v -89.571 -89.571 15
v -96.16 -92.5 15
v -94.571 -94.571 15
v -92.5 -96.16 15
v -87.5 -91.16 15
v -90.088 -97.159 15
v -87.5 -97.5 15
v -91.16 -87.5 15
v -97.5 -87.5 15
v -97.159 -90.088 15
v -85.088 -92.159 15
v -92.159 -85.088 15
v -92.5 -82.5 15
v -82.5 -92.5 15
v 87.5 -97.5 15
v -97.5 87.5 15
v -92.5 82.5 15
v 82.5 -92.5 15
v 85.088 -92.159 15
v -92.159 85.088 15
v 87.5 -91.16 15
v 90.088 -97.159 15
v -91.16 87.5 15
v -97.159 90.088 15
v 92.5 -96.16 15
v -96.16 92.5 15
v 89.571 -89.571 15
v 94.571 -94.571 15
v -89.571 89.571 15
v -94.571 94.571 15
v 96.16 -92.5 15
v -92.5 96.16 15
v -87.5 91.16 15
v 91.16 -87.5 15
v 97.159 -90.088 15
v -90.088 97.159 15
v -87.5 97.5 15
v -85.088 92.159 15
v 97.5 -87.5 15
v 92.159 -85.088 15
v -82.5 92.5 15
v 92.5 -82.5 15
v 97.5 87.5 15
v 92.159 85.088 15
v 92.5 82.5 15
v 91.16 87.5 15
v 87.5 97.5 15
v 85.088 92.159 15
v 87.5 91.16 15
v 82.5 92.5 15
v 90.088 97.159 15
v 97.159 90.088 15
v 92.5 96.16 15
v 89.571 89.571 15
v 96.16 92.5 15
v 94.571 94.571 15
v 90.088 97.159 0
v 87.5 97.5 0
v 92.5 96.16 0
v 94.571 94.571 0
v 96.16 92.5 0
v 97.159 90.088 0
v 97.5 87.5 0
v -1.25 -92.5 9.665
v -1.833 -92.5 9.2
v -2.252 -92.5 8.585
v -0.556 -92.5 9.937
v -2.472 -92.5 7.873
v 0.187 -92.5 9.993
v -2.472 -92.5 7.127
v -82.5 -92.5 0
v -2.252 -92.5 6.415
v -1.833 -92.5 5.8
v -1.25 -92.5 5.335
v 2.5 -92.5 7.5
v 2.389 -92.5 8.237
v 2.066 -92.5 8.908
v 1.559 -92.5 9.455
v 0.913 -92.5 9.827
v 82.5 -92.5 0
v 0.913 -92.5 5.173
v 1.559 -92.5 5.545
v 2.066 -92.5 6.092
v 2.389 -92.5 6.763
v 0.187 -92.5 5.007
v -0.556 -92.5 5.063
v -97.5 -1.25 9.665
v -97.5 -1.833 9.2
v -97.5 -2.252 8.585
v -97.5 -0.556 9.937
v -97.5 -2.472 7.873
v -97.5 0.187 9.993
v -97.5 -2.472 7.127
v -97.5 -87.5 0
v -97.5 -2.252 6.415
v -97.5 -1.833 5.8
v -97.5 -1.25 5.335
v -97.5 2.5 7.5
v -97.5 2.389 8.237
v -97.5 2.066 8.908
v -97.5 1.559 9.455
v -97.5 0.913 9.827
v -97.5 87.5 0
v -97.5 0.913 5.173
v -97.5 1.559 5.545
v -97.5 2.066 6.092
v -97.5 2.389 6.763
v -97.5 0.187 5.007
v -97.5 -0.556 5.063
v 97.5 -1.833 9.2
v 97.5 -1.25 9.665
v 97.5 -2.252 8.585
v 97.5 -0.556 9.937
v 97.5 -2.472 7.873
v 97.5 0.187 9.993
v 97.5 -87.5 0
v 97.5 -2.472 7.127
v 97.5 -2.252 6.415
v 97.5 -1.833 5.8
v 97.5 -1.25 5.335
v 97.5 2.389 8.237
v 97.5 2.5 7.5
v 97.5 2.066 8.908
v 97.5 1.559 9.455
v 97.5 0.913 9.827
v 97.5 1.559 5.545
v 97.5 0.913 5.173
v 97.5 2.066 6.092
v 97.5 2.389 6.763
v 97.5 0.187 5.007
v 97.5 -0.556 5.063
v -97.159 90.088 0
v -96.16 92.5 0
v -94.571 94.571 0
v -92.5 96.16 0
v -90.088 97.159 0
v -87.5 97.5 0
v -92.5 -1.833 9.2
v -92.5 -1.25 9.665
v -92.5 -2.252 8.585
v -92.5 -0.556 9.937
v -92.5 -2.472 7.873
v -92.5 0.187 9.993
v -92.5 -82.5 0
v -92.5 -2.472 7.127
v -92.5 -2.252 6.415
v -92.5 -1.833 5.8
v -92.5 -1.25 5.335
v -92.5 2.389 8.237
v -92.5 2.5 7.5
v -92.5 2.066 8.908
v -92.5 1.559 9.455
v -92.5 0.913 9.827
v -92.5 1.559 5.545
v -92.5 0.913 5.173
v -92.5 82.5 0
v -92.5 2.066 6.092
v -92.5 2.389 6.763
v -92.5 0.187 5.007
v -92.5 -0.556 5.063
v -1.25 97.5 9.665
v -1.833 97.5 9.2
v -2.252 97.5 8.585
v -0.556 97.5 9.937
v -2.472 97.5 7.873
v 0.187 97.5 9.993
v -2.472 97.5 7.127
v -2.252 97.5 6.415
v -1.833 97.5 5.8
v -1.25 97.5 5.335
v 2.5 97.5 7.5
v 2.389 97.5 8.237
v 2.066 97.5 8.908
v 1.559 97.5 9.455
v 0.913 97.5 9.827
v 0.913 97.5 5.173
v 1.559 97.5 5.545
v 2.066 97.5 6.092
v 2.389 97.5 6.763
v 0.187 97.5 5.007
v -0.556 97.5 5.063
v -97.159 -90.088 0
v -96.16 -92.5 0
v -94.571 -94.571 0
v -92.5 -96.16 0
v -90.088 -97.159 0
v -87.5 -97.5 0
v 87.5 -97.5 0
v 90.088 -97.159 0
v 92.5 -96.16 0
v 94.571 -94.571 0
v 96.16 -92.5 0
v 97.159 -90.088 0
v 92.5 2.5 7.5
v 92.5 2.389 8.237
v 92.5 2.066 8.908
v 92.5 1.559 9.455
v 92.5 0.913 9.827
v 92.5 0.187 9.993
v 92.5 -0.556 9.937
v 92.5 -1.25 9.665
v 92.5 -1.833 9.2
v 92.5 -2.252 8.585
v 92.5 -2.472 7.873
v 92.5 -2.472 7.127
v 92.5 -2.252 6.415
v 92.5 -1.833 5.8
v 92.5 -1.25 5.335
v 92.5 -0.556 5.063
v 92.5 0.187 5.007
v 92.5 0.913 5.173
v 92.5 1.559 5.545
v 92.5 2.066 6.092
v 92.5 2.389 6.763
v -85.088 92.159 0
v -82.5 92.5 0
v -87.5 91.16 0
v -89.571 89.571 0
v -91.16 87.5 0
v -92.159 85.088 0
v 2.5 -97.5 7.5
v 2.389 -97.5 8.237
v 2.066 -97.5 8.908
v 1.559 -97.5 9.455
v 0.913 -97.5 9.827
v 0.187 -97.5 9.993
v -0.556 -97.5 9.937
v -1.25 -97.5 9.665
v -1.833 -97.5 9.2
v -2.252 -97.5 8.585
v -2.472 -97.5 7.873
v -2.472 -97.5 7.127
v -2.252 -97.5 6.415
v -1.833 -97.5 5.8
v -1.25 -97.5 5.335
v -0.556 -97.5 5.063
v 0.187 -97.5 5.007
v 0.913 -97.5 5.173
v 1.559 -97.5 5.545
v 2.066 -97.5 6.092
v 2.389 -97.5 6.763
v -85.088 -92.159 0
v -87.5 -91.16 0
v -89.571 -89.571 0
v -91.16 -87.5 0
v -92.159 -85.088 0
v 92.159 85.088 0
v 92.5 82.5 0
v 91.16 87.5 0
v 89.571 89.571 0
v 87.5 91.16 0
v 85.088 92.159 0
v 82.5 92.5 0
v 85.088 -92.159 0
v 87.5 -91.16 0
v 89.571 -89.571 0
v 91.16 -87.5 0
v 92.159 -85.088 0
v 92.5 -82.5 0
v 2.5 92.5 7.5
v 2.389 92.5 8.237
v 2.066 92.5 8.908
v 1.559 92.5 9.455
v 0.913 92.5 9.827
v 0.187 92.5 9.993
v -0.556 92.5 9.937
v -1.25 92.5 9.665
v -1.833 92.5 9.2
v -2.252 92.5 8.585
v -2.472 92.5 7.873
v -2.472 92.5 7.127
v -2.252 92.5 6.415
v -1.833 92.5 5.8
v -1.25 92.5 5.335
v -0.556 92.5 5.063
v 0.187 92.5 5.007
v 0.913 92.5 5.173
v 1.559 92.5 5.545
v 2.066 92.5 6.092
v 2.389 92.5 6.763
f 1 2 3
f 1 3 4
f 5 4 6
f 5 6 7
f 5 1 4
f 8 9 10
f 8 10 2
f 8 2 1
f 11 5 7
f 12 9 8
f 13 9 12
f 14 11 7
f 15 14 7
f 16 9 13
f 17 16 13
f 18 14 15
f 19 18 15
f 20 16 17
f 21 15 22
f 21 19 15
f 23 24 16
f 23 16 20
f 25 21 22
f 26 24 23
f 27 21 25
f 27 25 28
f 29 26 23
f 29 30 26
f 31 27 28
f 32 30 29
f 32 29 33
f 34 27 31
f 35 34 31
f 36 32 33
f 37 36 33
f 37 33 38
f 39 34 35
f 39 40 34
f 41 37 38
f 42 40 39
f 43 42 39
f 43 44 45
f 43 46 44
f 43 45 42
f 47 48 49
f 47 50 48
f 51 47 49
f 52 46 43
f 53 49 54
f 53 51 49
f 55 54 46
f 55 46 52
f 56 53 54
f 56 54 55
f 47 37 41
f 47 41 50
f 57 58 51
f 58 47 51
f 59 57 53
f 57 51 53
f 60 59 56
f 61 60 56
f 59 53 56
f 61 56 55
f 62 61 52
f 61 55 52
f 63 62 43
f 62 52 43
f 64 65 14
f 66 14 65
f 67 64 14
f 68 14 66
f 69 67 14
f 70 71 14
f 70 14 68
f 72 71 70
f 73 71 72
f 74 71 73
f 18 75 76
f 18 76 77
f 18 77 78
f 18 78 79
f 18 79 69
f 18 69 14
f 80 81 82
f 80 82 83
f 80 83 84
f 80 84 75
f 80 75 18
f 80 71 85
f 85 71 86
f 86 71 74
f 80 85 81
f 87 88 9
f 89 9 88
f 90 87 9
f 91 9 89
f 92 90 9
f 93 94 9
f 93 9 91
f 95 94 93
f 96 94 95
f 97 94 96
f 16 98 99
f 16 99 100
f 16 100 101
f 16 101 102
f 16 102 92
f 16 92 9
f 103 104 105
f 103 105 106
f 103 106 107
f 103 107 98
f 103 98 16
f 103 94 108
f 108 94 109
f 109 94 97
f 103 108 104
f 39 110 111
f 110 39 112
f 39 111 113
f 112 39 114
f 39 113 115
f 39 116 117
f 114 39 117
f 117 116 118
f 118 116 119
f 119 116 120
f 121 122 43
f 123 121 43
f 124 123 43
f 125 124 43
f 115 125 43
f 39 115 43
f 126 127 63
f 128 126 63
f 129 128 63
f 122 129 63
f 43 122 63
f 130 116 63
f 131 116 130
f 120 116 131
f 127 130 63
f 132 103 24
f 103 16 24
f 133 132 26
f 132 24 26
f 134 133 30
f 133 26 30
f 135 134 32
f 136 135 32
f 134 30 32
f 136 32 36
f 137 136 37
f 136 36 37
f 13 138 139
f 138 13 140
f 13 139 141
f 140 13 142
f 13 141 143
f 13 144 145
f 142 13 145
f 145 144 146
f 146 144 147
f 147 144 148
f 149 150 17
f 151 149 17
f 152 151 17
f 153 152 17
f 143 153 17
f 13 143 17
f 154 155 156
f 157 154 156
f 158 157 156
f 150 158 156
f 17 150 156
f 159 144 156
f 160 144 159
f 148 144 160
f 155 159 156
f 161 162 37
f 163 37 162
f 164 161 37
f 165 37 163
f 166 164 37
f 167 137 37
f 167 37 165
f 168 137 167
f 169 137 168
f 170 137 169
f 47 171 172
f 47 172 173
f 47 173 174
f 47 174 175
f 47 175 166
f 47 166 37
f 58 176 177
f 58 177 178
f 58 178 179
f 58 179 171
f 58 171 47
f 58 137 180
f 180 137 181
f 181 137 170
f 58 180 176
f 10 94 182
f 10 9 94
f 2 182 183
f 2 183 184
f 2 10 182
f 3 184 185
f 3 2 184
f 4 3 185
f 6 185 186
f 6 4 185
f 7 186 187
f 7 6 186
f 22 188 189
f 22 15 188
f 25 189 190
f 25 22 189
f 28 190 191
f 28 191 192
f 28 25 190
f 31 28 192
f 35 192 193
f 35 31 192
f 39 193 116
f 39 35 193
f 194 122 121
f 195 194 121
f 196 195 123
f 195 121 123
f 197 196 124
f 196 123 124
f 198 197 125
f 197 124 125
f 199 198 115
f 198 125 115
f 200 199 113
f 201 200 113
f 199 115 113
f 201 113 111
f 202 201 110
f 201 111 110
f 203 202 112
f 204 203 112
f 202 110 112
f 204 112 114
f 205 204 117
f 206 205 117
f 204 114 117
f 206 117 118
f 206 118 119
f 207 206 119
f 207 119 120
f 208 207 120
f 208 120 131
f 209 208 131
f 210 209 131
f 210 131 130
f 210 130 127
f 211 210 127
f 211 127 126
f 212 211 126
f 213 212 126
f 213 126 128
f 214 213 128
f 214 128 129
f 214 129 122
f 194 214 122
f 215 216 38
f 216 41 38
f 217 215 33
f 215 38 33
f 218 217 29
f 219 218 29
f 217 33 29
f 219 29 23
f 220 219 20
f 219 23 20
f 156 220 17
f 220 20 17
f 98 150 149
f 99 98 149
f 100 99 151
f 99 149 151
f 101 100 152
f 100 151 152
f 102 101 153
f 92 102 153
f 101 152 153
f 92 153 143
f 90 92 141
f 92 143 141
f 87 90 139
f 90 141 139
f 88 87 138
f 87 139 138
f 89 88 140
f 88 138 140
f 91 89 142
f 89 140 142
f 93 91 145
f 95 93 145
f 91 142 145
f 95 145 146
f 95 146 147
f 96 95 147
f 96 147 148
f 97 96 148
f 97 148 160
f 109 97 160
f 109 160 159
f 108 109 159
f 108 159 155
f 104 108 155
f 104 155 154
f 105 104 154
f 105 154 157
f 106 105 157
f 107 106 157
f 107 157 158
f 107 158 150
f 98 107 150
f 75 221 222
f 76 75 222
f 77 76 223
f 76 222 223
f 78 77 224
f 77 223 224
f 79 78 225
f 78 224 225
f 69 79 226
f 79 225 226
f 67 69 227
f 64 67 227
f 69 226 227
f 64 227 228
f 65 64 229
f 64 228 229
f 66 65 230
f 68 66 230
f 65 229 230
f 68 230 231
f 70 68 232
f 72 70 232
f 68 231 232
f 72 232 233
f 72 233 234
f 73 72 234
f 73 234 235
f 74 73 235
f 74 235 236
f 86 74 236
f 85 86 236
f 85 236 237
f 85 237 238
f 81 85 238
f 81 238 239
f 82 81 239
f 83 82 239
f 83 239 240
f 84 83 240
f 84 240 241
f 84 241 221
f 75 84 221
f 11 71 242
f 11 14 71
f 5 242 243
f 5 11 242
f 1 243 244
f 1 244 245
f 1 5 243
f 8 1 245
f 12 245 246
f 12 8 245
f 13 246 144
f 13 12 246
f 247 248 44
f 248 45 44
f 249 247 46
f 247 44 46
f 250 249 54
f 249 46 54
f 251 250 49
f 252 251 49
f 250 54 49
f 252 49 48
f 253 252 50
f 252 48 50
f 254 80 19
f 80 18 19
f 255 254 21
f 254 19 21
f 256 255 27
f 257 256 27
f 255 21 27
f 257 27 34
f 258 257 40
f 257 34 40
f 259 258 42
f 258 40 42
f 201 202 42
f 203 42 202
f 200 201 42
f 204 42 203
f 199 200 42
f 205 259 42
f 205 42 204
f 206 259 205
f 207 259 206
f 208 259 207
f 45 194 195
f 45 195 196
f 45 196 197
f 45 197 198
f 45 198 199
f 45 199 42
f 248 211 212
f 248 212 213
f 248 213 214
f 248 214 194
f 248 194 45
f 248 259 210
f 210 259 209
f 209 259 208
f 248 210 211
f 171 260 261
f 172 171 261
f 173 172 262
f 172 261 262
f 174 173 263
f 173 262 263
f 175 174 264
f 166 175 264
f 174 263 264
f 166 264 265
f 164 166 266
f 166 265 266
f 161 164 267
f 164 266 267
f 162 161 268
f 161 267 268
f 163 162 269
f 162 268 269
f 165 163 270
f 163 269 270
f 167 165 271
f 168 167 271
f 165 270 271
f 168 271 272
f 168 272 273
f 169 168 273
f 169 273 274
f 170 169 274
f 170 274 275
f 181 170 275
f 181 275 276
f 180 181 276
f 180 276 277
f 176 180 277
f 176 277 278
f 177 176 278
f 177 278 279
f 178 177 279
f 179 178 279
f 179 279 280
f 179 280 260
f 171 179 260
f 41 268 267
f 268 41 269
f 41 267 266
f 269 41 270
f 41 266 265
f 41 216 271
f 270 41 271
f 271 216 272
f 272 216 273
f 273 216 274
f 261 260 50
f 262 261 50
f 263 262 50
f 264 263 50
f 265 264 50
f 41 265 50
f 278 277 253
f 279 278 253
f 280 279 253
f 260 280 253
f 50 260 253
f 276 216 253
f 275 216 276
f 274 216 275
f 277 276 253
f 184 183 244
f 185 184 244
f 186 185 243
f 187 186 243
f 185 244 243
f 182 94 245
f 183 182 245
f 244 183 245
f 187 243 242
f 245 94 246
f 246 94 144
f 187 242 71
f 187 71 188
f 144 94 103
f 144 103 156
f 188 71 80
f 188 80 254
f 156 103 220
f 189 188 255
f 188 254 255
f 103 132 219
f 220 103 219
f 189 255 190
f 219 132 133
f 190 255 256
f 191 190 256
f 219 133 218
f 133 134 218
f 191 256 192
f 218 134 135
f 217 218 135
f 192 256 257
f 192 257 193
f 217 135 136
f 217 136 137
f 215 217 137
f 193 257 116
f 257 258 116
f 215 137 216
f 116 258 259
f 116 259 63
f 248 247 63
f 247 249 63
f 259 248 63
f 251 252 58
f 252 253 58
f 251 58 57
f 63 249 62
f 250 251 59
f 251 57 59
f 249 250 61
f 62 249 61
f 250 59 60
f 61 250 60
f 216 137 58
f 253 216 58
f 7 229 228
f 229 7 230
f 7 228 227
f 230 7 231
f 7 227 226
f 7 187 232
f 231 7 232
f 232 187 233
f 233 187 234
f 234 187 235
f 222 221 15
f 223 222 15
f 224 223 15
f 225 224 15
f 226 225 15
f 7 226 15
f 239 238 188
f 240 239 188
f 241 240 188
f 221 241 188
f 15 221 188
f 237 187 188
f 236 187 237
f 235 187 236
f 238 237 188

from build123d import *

# Parameters (mm, degrees)
F0_W     = 194.99999
F0_H     = 194.99999
F0_W_2   = 185
F0_H_2   = 185
F1_DEPTH = 15
F2_R     = 10
F3_R     = 2.5
F4_DEPTH = 195.00099
F5_R     = 2.5
F6_DEPTH = 195.00099


with BuildPart() as f1:
    # F0 (on Top) → F1 (new body)
    with BuildSketch(Plane.XY):
        Rectangle(F0_W, F0_H)
        Rectangle(F0_W_2, F0_H_2, mode=Mode.SUBTRACT)
    extrude(amount=F1_DEPTH)

    # F2
    f2_edges = [f1.edges().sort_by_distance(p)[0] for p in [
        (-97.499995, -97.499995, 7.5),
        (97.499995, -97.499995, 7.5),
        (92.5, 92.5, 7.5),
        (-97.499995, 97.499995, 7.5),
        (97.499995, 97.499995, 7.5),
        (92.5, -92.5, 7.5),
        (-92.5, -92.5, 7.5),
        (-92.5, 92.5, 7.5),
    ]]
    fillet(f2_edges, radius=F2_R)

    # F3 (on face) → F4 (cut, through all)
    with BuildSketch(Plane.YZ.offset(97.499995)):
        with Locations((0, 7.5)):
            Circle(F3_R)
    extrude(amount=-F4_DEPTH, mode=Mode.SUBTRACT)

    # F5 (on face) → F6 (cut, through all)
    with BuildSketch(Plane.XZ.offset(97.499995)):
        with Locations((0, 7.5)):
            Circle(F5_R)
    extrude(amount=-F6_DEPTH, mode=Mode.SUBTRACT)


solid = f1.part
